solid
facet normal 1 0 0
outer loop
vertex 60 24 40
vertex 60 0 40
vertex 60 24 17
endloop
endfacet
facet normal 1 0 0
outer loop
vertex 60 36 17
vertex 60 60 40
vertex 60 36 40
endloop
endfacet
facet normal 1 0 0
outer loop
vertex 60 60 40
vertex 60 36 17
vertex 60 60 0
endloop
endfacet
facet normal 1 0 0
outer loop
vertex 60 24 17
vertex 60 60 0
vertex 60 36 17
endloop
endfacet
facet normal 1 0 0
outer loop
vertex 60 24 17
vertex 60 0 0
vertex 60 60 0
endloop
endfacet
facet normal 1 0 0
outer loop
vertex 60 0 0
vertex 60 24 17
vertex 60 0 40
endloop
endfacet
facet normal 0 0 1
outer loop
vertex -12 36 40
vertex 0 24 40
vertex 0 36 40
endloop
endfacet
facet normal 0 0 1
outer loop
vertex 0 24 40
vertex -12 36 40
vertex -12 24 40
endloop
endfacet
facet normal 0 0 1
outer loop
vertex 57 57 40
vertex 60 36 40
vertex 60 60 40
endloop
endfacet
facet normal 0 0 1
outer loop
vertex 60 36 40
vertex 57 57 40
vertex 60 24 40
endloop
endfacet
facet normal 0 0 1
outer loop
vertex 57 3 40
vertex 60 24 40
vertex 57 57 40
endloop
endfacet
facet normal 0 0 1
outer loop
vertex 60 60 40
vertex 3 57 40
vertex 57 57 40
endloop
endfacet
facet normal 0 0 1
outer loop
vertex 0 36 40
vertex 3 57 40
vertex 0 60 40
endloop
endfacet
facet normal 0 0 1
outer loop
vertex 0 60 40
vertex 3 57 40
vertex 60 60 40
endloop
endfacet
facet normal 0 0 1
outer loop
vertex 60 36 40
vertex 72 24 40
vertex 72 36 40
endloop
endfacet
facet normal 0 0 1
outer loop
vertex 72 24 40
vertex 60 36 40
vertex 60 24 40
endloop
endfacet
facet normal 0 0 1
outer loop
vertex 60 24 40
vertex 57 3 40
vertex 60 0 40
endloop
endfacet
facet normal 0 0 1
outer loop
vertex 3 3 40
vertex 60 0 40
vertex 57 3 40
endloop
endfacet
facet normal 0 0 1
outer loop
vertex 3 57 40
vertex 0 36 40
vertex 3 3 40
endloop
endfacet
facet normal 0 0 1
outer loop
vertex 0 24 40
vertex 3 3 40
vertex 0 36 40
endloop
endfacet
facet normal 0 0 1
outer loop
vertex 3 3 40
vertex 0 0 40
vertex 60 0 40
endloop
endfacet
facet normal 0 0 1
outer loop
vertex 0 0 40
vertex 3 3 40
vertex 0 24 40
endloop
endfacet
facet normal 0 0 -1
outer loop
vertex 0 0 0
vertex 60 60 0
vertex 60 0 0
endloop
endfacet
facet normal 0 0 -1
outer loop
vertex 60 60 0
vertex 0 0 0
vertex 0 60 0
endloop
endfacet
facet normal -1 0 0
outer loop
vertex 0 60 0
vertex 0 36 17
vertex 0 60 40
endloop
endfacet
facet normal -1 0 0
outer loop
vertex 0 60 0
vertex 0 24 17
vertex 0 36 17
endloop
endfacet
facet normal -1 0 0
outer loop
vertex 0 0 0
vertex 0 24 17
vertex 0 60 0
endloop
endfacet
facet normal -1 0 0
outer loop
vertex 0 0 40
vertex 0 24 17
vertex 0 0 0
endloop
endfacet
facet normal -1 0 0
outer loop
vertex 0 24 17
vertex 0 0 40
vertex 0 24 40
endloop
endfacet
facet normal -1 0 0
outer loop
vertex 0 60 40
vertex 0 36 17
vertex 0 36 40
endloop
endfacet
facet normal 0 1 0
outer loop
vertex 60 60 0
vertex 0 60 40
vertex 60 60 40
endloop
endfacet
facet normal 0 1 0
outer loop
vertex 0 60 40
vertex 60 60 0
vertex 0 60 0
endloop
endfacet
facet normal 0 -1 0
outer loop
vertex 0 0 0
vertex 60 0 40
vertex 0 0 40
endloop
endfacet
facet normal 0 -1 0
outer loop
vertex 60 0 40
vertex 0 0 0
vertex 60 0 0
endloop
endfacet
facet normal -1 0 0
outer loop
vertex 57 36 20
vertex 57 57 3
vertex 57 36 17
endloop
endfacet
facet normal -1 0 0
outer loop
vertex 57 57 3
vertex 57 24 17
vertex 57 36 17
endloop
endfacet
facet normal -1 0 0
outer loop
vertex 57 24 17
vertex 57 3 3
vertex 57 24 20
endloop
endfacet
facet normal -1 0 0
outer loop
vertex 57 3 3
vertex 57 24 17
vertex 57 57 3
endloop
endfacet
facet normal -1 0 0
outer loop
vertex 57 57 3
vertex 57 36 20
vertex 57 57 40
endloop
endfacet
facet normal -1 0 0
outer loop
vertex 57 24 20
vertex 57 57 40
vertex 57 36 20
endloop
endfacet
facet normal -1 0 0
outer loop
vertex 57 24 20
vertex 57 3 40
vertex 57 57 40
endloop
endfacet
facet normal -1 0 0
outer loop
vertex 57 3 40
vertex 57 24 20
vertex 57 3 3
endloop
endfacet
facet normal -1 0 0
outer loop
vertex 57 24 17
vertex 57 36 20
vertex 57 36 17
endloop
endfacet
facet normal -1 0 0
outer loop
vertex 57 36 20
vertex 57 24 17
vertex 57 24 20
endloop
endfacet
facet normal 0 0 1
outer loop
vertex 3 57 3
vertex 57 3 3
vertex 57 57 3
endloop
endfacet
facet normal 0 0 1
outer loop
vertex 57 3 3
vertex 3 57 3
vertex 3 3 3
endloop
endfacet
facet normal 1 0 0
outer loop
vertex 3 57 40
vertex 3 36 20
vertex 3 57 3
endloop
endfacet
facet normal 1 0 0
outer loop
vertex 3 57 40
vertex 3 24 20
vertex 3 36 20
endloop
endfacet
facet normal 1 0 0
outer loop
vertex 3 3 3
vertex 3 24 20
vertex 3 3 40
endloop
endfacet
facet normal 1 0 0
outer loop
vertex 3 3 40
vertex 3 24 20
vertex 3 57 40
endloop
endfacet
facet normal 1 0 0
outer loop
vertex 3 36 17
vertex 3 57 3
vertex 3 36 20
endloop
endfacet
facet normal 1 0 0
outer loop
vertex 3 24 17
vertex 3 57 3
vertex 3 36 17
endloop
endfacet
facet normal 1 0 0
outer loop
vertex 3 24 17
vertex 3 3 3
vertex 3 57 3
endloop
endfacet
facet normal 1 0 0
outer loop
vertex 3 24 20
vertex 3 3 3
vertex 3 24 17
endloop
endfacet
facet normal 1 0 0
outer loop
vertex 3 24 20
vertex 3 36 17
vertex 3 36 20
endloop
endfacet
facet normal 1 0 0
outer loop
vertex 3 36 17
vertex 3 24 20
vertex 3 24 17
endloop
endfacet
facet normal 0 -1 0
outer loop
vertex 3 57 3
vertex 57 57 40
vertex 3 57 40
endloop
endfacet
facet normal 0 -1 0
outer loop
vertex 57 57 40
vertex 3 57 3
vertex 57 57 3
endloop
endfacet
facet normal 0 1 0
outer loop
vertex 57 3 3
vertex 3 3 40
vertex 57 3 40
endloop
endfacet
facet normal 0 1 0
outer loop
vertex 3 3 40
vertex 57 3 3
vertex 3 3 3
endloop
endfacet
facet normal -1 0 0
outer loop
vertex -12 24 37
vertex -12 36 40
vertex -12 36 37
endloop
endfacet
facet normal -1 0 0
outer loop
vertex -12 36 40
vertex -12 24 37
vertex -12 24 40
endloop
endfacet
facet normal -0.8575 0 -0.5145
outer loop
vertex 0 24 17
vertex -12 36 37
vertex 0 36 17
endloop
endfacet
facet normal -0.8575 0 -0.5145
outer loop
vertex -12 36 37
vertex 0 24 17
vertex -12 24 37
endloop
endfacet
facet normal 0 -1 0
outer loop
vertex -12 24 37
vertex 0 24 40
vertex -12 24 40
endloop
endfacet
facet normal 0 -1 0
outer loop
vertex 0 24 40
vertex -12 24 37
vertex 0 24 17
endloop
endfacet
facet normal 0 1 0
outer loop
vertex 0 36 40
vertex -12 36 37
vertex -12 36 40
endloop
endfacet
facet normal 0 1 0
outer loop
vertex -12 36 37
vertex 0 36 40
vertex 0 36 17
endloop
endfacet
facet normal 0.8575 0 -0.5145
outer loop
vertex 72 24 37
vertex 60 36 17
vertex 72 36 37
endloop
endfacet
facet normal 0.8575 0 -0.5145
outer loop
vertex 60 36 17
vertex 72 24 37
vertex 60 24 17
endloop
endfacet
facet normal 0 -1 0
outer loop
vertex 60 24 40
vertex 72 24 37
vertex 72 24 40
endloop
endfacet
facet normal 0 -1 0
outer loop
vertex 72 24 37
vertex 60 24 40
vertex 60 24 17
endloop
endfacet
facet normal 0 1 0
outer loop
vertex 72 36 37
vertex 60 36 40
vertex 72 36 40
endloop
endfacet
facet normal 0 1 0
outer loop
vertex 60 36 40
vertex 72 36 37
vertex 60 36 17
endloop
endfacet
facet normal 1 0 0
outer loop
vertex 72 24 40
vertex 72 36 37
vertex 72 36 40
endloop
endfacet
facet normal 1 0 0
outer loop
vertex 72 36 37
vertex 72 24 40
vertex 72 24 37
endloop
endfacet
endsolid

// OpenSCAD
height=40;
wall = 3;
wall2 = wall * 2;

difference() {
    cube([60,60,height]);
    translate([wall,wall,wall]) cube([60-wall2,60-wall2,height]);
}

hull() {
    translate([-12,30-12/2,height-wall]) cube([12,12,wall]);
    translate([0,30-12/2,height/2-wall]) cube([wall,12,wall]);
}

hull() {
    translate([60,30-12/2,height-wall]) cube([12,12,wall]);
    translate([60-wall,30-12/2,height/2-wall]) cube([wall,12,wall]);
}
